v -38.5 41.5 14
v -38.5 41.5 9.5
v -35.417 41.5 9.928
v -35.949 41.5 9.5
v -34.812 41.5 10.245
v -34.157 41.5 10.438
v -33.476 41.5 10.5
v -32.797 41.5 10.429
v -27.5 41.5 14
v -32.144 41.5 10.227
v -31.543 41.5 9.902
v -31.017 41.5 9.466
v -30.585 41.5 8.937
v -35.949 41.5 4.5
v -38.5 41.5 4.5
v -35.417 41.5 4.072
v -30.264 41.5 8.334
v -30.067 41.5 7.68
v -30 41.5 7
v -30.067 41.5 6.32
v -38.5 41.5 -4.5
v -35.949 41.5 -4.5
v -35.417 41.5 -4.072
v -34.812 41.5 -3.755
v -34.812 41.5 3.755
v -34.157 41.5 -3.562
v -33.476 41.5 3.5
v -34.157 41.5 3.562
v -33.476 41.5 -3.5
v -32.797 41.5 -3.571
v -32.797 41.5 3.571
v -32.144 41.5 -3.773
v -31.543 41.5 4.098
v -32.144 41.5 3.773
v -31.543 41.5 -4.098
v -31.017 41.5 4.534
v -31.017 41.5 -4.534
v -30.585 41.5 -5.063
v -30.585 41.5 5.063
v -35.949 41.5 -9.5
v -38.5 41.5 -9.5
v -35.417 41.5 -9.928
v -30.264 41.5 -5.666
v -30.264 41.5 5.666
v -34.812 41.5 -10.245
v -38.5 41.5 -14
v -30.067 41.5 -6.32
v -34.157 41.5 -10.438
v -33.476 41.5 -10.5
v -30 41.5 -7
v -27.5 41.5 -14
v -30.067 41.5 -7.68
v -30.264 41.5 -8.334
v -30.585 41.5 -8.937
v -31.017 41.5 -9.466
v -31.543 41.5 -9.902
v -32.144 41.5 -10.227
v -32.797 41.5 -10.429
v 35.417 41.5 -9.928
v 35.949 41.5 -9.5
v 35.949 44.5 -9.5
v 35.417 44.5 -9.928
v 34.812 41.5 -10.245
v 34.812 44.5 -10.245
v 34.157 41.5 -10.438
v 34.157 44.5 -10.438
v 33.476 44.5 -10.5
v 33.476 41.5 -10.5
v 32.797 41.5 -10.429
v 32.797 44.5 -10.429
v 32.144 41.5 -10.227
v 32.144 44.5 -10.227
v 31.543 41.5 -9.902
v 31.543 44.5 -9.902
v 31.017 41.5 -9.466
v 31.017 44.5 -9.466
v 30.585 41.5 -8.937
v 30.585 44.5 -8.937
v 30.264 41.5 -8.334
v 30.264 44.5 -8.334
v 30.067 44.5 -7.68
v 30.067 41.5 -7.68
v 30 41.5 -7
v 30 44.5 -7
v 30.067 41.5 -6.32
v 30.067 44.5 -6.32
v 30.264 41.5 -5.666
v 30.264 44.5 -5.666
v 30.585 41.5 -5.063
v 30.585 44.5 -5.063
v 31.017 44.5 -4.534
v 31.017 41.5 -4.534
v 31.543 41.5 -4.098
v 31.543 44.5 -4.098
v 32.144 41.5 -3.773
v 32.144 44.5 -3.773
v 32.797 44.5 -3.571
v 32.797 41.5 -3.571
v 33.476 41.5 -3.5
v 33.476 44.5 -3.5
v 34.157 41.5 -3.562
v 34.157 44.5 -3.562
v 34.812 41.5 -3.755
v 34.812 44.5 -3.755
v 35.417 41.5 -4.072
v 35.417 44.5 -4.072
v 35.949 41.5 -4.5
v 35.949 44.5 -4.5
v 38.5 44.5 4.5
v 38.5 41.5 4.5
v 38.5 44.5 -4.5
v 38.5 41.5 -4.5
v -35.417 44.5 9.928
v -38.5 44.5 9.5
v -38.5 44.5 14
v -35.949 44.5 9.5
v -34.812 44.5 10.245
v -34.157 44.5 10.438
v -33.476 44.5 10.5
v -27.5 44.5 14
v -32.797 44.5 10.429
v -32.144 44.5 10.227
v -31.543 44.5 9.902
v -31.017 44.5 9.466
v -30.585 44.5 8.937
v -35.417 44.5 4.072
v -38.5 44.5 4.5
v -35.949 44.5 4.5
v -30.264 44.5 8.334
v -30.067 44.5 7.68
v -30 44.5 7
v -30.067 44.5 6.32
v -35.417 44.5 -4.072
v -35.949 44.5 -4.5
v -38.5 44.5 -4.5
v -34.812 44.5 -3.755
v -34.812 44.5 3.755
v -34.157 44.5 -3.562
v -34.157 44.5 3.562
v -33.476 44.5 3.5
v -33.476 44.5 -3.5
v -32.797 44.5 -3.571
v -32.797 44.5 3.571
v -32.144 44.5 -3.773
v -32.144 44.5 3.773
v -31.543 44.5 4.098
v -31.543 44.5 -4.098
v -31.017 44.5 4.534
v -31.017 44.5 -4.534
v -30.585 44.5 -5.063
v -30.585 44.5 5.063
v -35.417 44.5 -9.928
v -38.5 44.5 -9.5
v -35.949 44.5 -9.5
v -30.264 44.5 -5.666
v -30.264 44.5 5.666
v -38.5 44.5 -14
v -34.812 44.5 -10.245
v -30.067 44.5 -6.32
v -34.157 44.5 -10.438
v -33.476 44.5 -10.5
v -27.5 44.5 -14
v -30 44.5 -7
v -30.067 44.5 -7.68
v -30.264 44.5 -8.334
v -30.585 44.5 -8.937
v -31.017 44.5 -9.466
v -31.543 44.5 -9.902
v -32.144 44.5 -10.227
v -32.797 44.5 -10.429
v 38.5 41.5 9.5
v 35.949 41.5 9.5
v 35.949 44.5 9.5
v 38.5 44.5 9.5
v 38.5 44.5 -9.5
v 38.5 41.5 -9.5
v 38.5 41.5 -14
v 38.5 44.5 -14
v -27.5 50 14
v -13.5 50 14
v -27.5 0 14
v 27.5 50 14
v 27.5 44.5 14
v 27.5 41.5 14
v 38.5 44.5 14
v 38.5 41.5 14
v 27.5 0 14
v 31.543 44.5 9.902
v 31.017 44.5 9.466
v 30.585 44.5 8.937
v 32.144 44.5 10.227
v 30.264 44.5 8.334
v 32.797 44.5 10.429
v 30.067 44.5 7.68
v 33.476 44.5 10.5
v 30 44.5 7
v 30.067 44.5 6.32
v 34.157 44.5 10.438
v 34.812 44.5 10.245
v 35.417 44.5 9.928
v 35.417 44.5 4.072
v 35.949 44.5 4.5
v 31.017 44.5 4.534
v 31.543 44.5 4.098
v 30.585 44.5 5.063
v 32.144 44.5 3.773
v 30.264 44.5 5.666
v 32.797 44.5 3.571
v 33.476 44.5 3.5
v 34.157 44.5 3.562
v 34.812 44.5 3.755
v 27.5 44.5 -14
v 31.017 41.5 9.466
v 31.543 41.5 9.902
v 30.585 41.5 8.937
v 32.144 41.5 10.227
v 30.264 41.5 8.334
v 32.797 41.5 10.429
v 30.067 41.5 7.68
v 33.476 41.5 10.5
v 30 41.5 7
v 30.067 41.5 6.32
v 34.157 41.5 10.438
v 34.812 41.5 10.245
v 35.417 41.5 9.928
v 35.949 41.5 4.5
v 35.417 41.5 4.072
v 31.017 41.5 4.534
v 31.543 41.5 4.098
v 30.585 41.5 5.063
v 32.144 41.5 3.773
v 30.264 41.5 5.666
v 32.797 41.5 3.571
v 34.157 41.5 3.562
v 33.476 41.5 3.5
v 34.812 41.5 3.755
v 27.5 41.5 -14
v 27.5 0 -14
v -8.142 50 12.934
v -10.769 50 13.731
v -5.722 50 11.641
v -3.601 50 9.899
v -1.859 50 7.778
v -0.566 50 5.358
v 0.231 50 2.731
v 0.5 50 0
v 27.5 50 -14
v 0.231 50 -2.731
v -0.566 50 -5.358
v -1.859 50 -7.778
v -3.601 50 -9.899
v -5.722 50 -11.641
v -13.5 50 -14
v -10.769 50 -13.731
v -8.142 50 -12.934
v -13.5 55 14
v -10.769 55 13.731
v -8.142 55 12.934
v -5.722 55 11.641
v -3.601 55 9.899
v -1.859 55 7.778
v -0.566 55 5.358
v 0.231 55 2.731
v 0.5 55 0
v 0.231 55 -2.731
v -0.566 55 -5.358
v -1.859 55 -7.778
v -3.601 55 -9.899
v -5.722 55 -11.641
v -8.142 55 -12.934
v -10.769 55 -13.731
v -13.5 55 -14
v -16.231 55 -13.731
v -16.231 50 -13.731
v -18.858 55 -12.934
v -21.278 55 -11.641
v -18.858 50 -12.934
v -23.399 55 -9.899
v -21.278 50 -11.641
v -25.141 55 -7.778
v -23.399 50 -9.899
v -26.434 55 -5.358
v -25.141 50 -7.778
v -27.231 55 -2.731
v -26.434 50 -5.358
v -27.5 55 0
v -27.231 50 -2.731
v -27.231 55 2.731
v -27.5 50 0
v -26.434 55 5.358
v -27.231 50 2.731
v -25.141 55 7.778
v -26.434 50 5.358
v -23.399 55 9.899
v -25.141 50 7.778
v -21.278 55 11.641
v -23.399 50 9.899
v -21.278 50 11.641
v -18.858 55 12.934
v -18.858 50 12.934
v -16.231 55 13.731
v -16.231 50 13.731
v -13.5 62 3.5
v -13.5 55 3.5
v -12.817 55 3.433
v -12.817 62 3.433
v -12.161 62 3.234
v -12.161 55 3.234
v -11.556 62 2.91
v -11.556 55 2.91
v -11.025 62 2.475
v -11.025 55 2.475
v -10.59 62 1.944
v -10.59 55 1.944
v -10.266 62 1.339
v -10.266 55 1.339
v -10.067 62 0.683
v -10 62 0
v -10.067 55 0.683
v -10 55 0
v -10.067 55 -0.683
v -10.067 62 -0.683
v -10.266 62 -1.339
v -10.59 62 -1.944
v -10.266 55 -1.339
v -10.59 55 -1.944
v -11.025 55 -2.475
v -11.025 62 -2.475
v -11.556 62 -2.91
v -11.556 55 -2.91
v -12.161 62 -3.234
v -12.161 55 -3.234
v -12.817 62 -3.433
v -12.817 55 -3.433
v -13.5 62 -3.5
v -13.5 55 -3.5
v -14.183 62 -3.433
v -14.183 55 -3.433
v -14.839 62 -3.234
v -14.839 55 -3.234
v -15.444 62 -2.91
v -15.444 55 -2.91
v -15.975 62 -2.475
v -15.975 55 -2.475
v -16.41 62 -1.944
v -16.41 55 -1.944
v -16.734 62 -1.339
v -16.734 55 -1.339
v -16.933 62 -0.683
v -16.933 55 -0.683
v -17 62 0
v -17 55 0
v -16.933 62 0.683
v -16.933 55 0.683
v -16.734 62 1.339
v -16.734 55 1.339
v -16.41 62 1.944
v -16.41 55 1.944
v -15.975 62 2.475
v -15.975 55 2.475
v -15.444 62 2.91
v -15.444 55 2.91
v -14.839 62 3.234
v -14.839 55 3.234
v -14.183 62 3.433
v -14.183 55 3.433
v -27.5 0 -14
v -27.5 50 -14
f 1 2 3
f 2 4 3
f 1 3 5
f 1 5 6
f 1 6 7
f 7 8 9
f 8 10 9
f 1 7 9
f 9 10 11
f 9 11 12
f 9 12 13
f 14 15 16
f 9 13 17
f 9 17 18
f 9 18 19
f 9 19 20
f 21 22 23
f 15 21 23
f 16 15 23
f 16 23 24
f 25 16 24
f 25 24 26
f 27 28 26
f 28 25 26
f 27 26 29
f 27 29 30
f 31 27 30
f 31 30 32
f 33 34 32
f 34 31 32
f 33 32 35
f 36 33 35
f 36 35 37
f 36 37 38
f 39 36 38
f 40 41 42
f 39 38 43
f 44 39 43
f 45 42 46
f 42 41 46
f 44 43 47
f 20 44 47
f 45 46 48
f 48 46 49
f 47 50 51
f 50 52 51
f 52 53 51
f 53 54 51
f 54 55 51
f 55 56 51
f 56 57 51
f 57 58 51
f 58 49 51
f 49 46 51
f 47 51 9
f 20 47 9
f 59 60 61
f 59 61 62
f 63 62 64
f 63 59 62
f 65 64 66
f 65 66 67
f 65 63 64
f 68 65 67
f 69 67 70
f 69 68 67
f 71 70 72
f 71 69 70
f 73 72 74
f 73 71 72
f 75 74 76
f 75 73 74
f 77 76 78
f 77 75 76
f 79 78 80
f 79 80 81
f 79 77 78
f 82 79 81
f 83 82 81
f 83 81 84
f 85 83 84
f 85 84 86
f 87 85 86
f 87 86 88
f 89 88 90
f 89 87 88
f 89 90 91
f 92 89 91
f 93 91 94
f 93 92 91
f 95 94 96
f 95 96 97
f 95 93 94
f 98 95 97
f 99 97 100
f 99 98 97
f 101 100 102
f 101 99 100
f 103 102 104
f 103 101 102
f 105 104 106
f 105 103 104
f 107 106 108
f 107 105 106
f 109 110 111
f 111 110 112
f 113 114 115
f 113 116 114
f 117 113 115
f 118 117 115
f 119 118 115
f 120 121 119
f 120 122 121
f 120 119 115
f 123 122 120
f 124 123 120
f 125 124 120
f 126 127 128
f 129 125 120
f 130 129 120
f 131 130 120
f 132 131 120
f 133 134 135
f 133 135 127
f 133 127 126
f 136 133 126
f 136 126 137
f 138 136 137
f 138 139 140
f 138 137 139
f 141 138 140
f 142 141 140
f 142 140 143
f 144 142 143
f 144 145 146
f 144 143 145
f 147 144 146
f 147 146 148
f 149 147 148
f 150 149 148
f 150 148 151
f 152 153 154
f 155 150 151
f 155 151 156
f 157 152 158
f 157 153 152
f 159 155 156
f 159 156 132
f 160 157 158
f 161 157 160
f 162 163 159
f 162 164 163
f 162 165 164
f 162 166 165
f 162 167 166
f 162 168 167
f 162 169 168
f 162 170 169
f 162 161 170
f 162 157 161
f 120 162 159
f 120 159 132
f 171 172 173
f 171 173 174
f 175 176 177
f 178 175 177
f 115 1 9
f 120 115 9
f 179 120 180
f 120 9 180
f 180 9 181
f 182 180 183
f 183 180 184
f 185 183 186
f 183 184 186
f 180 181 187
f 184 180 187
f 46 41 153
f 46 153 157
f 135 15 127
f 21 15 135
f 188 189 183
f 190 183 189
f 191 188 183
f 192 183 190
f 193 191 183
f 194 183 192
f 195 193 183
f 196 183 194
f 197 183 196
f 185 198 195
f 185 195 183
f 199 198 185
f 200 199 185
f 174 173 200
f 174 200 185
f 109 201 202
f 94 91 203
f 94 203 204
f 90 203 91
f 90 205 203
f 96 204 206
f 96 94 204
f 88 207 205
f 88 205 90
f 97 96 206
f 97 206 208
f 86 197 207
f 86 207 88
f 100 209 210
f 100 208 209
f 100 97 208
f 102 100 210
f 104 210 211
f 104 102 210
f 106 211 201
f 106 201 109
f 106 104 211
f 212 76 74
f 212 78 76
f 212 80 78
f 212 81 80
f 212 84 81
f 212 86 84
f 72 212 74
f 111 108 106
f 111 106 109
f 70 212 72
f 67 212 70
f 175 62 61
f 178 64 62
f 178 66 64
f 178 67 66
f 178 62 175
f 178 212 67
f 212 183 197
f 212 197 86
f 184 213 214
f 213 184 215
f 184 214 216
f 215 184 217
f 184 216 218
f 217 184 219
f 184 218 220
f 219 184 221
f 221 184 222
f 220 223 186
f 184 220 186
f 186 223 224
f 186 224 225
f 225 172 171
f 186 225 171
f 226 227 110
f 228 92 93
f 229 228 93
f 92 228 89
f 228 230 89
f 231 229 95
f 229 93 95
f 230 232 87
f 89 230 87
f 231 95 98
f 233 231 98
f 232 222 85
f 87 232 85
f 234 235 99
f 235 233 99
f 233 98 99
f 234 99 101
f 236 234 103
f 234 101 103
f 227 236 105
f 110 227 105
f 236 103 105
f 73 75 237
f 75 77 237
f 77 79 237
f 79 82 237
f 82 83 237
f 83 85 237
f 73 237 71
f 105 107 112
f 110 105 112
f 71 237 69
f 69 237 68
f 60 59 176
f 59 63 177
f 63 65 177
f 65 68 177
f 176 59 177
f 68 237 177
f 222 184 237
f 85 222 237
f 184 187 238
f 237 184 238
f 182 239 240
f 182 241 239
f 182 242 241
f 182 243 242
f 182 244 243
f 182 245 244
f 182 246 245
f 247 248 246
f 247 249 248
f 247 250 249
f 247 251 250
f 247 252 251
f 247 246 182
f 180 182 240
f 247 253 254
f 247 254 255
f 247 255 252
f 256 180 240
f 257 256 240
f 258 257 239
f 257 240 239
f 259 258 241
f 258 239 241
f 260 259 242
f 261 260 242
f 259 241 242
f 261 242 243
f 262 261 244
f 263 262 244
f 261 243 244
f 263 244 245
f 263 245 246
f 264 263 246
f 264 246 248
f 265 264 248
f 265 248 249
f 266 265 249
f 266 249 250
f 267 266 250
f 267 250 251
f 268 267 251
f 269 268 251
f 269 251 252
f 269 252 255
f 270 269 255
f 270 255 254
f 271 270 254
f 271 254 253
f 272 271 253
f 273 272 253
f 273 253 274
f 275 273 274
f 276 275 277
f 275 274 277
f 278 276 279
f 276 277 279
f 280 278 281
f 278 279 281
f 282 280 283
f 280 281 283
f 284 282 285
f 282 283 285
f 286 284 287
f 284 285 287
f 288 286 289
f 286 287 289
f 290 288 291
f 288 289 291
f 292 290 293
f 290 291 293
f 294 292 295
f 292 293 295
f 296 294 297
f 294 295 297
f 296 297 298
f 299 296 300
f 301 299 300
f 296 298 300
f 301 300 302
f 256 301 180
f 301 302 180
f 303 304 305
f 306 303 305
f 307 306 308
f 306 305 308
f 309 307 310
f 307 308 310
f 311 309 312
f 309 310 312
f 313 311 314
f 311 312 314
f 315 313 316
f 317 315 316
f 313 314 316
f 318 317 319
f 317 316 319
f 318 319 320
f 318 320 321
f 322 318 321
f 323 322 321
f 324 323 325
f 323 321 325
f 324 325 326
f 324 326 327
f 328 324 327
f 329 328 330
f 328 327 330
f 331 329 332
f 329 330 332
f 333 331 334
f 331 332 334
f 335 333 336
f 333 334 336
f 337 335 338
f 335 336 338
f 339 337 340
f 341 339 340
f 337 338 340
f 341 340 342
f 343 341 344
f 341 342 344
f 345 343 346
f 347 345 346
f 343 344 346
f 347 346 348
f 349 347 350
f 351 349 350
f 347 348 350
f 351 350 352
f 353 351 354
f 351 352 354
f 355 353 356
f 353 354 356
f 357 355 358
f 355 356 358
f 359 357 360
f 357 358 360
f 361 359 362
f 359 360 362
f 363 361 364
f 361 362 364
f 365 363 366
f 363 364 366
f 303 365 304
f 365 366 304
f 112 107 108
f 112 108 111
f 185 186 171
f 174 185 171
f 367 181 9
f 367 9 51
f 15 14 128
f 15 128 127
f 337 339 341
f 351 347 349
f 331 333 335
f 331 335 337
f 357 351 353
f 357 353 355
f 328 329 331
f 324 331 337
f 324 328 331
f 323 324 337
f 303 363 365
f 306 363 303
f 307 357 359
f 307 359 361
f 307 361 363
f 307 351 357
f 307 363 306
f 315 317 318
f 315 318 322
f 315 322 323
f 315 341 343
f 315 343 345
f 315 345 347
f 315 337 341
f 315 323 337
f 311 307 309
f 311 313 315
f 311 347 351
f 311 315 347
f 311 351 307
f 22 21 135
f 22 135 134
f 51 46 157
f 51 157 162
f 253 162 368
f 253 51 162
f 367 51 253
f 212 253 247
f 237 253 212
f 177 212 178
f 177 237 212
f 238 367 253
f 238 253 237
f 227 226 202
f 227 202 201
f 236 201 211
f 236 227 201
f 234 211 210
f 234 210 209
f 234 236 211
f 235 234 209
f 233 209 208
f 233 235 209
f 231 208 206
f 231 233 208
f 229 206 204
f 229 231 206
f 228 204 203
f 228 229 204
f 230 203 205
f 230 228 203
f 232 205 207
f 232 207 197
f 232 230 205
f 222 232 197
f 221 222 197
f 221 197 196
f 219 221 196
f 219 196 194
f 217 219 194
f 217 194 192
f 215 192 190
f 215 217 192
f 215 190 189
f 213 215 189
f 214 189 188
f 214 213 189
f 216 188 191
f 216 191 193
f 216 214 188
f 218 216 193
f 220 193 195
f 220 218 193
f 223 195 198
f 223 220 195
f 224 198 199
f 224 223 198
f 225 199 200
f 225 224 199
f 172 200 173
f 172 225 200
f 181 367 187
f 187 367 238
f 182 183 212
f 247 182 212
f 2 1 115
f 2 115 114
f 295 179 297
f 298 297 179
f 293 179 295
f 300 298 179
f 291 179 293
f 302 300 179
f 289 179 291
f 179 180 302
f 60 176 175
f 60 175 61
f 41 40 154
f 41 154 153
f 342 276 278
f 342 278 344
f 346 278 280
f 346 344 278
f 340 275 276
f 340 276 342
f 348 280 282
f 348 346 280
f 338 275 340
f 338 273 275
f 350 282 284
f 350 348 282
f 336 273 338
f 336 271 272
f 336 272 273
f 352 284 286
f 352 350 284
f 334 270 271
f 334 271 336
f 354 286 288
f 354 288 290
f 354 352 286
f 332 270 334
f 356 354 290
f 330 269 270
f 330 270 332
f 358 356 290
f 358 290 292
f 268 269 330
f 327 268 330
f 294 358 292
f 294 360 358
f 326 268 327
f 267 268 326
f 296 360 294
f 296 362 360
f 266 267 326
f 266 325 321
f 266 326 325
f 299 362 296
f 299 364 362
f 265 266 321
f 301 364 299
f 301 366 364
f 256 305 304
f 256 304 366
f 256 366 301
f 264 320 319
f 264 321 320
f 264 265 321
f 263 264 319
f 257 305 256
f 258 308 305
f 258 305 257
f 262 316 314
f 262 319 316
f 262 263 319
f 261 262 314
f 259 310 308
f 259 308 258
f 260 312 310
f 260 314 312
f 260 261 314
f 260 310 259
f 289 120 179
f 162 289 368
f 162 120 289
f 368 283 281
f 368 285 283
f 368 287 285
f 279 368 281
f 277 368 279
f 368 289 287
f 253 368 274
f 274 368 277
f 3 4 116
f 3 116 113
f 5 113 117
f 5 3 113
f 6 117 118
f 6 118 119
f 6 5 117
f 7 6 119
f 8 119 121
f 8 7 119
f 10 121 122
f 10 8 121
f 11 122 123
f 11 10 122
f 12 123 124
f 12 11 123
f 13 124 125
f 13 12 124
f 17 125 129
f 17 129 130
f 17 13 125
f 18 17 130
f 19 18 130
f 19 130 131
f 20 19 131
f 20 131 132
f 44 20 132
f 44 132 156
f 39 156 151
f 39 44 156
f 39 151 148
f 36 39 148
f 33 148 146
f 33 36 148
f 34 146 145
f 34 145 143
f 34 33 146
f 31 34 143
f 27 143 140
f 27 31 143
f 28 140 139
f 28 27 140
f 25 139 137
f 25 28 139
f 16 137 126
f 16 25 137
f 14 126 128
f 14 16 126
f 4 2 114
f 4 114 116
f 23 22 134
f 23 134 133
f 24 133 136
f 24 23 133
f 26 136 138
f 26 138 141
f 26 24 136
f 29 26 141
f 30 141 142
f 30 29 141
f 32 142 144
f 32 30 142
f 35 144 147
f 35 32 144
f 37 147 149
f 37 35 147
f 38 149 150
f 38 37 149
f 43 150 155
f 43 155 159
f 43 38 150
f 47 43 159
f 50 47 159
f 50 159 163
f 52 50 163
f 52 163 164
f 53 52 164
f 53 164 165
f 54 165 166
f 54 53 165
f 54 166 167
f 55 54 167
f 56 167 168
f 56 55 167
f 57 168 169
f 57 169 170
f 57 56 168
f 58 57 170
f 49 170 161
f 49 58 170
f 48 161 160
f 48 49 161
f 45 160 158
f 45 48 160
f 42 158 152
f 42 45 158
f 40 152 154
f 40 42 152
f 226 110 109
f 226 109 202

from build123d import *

# Parameters (mm, degrees)
SKETCH1_W           = 55
SKETCH1_H           = 28
BOSS_EXTRUDE1_DEPTH = 50
SKETCH2_R           = 14
BOSS_EXTRUDE2_DEPTH = 5
SKETCH3_R           = 3.5
BOSS_EXTRUDE3_DEPTH = 7
SKETCH4_W           = 11
SKETCH4_H           = 28
BOSS_EXTRUDE4_DEPTH = 3
CUT_EXTRUDE1_DEPTH  = 3


with BuildPart() as part:
    # Sketch1 → Boss-Extrude1 (new body)
    with BuildSketch(Plane(origin=(0, 0, 0), x_dir=(1, 0, 0), z_dir=(0, 1, 0))):
        Rectangle(SKETCH1_W, SKETCH1_H)
    extrude(amount=BOSS_EXTRUDE1_DEPTH)

    # Sketch2 → Boss-Extrude2 (add)
    with BuildSketch(Plane(origin=(0, 50, 0), x_dir=(1, 0, 0), z_dir=(0, 1, 0))):
        with Locations(Location((-13.5, 0, 0), (0, 0, 270))):
            Circle(SKETCH2_R)
    extrude(amount=BOSS_EXTRUDE2_DEPTH)

    # Sketch3 → Boss-Extrude3 (add)
    with BuildSketch(Plane(origin=(0, 55, 0), x_dir=(1, 0, 0), z_dir=(0, 1, 0))):
        with Locations(Location((-13.5, 0, 0), (0, 0, 270))):
            Circle(SKETCH3_R)
    extrude(amount=BOSS_EXTRUDE3_DEPTH)

    # Sketch4 → Boss-Extrude4 (add)
    with BuildSketch(Plane(origin=(0, 41.5, 0), x_dir=(1, 0, 0), z_dir=(0, 1, 0))):
        with Locations((33, 0)):
            Rectangle(SKETCH4_W, SKETCH4_H)
        with Locations((-33, 0)):
            Rectangle(SKETCH4_W, SKETCH4_H)
    extrude(amount=BOSS_EXTRUDE4_DEPTH)

    # Sketch5 → Cut-Extrude1 (cut)
    with BuildSketch(Plane(origin=(0, 41.5, 0), x_dir=(1, 0, 0), z_dir=(0, 1, 0))):
        with BuildLine():
            Line((35.949489743, 4.5), (38.5, 4.5))
            Line((38.5, 4.5), (38.5, 9.5))
            Line((38.5, 9.5), (35.949489743, 9.5))
            ThreePointArc((35.949489743, 9.5), (30, 7), (35.949489743, 4.5))
        make_face()
        with BuildLine():
            Line((38.5, -9.5), (38.5, -4.5))
            Line((38.5, -4.5), (35.949489743, -4.5))
            ThreePointArc((35.949489743, -4.5), (30, -7), (35.949489743, -9.5))
            Line((35.949489743, -9.5), (38.5, -9.5))
        make_face()
        with BuildLine():
            Line((-35.949489743, -4.5), (-38.5, -4.5))
            Line((-38.5, -4.5), (-38.5, -9.5))
            Line((-38.5, -9.5), (-35.949489743, -9.5))
            ThreePointArc((-35.949489743, -9.5), (-30, -7), (-35.949489743, -4.5))
        make_face()
        with BuildLine():
            Line((-38.5, 9.5), (-38.5, 4.5))
            Line((-38.5, 4.5), (-35.949489743, 4.5))
            ThreePointArc((-35.949489743, 4.5), (-30, 7), (-35.949489743, 9.5))
            Line((-35.949489743, 9.5), (-38.5, 9.5))
        make_face()
    extrude(amount=CUT_EXTRUDE1_DEPTH, mode=Mode.SUBTRACT)


solid = part.part
